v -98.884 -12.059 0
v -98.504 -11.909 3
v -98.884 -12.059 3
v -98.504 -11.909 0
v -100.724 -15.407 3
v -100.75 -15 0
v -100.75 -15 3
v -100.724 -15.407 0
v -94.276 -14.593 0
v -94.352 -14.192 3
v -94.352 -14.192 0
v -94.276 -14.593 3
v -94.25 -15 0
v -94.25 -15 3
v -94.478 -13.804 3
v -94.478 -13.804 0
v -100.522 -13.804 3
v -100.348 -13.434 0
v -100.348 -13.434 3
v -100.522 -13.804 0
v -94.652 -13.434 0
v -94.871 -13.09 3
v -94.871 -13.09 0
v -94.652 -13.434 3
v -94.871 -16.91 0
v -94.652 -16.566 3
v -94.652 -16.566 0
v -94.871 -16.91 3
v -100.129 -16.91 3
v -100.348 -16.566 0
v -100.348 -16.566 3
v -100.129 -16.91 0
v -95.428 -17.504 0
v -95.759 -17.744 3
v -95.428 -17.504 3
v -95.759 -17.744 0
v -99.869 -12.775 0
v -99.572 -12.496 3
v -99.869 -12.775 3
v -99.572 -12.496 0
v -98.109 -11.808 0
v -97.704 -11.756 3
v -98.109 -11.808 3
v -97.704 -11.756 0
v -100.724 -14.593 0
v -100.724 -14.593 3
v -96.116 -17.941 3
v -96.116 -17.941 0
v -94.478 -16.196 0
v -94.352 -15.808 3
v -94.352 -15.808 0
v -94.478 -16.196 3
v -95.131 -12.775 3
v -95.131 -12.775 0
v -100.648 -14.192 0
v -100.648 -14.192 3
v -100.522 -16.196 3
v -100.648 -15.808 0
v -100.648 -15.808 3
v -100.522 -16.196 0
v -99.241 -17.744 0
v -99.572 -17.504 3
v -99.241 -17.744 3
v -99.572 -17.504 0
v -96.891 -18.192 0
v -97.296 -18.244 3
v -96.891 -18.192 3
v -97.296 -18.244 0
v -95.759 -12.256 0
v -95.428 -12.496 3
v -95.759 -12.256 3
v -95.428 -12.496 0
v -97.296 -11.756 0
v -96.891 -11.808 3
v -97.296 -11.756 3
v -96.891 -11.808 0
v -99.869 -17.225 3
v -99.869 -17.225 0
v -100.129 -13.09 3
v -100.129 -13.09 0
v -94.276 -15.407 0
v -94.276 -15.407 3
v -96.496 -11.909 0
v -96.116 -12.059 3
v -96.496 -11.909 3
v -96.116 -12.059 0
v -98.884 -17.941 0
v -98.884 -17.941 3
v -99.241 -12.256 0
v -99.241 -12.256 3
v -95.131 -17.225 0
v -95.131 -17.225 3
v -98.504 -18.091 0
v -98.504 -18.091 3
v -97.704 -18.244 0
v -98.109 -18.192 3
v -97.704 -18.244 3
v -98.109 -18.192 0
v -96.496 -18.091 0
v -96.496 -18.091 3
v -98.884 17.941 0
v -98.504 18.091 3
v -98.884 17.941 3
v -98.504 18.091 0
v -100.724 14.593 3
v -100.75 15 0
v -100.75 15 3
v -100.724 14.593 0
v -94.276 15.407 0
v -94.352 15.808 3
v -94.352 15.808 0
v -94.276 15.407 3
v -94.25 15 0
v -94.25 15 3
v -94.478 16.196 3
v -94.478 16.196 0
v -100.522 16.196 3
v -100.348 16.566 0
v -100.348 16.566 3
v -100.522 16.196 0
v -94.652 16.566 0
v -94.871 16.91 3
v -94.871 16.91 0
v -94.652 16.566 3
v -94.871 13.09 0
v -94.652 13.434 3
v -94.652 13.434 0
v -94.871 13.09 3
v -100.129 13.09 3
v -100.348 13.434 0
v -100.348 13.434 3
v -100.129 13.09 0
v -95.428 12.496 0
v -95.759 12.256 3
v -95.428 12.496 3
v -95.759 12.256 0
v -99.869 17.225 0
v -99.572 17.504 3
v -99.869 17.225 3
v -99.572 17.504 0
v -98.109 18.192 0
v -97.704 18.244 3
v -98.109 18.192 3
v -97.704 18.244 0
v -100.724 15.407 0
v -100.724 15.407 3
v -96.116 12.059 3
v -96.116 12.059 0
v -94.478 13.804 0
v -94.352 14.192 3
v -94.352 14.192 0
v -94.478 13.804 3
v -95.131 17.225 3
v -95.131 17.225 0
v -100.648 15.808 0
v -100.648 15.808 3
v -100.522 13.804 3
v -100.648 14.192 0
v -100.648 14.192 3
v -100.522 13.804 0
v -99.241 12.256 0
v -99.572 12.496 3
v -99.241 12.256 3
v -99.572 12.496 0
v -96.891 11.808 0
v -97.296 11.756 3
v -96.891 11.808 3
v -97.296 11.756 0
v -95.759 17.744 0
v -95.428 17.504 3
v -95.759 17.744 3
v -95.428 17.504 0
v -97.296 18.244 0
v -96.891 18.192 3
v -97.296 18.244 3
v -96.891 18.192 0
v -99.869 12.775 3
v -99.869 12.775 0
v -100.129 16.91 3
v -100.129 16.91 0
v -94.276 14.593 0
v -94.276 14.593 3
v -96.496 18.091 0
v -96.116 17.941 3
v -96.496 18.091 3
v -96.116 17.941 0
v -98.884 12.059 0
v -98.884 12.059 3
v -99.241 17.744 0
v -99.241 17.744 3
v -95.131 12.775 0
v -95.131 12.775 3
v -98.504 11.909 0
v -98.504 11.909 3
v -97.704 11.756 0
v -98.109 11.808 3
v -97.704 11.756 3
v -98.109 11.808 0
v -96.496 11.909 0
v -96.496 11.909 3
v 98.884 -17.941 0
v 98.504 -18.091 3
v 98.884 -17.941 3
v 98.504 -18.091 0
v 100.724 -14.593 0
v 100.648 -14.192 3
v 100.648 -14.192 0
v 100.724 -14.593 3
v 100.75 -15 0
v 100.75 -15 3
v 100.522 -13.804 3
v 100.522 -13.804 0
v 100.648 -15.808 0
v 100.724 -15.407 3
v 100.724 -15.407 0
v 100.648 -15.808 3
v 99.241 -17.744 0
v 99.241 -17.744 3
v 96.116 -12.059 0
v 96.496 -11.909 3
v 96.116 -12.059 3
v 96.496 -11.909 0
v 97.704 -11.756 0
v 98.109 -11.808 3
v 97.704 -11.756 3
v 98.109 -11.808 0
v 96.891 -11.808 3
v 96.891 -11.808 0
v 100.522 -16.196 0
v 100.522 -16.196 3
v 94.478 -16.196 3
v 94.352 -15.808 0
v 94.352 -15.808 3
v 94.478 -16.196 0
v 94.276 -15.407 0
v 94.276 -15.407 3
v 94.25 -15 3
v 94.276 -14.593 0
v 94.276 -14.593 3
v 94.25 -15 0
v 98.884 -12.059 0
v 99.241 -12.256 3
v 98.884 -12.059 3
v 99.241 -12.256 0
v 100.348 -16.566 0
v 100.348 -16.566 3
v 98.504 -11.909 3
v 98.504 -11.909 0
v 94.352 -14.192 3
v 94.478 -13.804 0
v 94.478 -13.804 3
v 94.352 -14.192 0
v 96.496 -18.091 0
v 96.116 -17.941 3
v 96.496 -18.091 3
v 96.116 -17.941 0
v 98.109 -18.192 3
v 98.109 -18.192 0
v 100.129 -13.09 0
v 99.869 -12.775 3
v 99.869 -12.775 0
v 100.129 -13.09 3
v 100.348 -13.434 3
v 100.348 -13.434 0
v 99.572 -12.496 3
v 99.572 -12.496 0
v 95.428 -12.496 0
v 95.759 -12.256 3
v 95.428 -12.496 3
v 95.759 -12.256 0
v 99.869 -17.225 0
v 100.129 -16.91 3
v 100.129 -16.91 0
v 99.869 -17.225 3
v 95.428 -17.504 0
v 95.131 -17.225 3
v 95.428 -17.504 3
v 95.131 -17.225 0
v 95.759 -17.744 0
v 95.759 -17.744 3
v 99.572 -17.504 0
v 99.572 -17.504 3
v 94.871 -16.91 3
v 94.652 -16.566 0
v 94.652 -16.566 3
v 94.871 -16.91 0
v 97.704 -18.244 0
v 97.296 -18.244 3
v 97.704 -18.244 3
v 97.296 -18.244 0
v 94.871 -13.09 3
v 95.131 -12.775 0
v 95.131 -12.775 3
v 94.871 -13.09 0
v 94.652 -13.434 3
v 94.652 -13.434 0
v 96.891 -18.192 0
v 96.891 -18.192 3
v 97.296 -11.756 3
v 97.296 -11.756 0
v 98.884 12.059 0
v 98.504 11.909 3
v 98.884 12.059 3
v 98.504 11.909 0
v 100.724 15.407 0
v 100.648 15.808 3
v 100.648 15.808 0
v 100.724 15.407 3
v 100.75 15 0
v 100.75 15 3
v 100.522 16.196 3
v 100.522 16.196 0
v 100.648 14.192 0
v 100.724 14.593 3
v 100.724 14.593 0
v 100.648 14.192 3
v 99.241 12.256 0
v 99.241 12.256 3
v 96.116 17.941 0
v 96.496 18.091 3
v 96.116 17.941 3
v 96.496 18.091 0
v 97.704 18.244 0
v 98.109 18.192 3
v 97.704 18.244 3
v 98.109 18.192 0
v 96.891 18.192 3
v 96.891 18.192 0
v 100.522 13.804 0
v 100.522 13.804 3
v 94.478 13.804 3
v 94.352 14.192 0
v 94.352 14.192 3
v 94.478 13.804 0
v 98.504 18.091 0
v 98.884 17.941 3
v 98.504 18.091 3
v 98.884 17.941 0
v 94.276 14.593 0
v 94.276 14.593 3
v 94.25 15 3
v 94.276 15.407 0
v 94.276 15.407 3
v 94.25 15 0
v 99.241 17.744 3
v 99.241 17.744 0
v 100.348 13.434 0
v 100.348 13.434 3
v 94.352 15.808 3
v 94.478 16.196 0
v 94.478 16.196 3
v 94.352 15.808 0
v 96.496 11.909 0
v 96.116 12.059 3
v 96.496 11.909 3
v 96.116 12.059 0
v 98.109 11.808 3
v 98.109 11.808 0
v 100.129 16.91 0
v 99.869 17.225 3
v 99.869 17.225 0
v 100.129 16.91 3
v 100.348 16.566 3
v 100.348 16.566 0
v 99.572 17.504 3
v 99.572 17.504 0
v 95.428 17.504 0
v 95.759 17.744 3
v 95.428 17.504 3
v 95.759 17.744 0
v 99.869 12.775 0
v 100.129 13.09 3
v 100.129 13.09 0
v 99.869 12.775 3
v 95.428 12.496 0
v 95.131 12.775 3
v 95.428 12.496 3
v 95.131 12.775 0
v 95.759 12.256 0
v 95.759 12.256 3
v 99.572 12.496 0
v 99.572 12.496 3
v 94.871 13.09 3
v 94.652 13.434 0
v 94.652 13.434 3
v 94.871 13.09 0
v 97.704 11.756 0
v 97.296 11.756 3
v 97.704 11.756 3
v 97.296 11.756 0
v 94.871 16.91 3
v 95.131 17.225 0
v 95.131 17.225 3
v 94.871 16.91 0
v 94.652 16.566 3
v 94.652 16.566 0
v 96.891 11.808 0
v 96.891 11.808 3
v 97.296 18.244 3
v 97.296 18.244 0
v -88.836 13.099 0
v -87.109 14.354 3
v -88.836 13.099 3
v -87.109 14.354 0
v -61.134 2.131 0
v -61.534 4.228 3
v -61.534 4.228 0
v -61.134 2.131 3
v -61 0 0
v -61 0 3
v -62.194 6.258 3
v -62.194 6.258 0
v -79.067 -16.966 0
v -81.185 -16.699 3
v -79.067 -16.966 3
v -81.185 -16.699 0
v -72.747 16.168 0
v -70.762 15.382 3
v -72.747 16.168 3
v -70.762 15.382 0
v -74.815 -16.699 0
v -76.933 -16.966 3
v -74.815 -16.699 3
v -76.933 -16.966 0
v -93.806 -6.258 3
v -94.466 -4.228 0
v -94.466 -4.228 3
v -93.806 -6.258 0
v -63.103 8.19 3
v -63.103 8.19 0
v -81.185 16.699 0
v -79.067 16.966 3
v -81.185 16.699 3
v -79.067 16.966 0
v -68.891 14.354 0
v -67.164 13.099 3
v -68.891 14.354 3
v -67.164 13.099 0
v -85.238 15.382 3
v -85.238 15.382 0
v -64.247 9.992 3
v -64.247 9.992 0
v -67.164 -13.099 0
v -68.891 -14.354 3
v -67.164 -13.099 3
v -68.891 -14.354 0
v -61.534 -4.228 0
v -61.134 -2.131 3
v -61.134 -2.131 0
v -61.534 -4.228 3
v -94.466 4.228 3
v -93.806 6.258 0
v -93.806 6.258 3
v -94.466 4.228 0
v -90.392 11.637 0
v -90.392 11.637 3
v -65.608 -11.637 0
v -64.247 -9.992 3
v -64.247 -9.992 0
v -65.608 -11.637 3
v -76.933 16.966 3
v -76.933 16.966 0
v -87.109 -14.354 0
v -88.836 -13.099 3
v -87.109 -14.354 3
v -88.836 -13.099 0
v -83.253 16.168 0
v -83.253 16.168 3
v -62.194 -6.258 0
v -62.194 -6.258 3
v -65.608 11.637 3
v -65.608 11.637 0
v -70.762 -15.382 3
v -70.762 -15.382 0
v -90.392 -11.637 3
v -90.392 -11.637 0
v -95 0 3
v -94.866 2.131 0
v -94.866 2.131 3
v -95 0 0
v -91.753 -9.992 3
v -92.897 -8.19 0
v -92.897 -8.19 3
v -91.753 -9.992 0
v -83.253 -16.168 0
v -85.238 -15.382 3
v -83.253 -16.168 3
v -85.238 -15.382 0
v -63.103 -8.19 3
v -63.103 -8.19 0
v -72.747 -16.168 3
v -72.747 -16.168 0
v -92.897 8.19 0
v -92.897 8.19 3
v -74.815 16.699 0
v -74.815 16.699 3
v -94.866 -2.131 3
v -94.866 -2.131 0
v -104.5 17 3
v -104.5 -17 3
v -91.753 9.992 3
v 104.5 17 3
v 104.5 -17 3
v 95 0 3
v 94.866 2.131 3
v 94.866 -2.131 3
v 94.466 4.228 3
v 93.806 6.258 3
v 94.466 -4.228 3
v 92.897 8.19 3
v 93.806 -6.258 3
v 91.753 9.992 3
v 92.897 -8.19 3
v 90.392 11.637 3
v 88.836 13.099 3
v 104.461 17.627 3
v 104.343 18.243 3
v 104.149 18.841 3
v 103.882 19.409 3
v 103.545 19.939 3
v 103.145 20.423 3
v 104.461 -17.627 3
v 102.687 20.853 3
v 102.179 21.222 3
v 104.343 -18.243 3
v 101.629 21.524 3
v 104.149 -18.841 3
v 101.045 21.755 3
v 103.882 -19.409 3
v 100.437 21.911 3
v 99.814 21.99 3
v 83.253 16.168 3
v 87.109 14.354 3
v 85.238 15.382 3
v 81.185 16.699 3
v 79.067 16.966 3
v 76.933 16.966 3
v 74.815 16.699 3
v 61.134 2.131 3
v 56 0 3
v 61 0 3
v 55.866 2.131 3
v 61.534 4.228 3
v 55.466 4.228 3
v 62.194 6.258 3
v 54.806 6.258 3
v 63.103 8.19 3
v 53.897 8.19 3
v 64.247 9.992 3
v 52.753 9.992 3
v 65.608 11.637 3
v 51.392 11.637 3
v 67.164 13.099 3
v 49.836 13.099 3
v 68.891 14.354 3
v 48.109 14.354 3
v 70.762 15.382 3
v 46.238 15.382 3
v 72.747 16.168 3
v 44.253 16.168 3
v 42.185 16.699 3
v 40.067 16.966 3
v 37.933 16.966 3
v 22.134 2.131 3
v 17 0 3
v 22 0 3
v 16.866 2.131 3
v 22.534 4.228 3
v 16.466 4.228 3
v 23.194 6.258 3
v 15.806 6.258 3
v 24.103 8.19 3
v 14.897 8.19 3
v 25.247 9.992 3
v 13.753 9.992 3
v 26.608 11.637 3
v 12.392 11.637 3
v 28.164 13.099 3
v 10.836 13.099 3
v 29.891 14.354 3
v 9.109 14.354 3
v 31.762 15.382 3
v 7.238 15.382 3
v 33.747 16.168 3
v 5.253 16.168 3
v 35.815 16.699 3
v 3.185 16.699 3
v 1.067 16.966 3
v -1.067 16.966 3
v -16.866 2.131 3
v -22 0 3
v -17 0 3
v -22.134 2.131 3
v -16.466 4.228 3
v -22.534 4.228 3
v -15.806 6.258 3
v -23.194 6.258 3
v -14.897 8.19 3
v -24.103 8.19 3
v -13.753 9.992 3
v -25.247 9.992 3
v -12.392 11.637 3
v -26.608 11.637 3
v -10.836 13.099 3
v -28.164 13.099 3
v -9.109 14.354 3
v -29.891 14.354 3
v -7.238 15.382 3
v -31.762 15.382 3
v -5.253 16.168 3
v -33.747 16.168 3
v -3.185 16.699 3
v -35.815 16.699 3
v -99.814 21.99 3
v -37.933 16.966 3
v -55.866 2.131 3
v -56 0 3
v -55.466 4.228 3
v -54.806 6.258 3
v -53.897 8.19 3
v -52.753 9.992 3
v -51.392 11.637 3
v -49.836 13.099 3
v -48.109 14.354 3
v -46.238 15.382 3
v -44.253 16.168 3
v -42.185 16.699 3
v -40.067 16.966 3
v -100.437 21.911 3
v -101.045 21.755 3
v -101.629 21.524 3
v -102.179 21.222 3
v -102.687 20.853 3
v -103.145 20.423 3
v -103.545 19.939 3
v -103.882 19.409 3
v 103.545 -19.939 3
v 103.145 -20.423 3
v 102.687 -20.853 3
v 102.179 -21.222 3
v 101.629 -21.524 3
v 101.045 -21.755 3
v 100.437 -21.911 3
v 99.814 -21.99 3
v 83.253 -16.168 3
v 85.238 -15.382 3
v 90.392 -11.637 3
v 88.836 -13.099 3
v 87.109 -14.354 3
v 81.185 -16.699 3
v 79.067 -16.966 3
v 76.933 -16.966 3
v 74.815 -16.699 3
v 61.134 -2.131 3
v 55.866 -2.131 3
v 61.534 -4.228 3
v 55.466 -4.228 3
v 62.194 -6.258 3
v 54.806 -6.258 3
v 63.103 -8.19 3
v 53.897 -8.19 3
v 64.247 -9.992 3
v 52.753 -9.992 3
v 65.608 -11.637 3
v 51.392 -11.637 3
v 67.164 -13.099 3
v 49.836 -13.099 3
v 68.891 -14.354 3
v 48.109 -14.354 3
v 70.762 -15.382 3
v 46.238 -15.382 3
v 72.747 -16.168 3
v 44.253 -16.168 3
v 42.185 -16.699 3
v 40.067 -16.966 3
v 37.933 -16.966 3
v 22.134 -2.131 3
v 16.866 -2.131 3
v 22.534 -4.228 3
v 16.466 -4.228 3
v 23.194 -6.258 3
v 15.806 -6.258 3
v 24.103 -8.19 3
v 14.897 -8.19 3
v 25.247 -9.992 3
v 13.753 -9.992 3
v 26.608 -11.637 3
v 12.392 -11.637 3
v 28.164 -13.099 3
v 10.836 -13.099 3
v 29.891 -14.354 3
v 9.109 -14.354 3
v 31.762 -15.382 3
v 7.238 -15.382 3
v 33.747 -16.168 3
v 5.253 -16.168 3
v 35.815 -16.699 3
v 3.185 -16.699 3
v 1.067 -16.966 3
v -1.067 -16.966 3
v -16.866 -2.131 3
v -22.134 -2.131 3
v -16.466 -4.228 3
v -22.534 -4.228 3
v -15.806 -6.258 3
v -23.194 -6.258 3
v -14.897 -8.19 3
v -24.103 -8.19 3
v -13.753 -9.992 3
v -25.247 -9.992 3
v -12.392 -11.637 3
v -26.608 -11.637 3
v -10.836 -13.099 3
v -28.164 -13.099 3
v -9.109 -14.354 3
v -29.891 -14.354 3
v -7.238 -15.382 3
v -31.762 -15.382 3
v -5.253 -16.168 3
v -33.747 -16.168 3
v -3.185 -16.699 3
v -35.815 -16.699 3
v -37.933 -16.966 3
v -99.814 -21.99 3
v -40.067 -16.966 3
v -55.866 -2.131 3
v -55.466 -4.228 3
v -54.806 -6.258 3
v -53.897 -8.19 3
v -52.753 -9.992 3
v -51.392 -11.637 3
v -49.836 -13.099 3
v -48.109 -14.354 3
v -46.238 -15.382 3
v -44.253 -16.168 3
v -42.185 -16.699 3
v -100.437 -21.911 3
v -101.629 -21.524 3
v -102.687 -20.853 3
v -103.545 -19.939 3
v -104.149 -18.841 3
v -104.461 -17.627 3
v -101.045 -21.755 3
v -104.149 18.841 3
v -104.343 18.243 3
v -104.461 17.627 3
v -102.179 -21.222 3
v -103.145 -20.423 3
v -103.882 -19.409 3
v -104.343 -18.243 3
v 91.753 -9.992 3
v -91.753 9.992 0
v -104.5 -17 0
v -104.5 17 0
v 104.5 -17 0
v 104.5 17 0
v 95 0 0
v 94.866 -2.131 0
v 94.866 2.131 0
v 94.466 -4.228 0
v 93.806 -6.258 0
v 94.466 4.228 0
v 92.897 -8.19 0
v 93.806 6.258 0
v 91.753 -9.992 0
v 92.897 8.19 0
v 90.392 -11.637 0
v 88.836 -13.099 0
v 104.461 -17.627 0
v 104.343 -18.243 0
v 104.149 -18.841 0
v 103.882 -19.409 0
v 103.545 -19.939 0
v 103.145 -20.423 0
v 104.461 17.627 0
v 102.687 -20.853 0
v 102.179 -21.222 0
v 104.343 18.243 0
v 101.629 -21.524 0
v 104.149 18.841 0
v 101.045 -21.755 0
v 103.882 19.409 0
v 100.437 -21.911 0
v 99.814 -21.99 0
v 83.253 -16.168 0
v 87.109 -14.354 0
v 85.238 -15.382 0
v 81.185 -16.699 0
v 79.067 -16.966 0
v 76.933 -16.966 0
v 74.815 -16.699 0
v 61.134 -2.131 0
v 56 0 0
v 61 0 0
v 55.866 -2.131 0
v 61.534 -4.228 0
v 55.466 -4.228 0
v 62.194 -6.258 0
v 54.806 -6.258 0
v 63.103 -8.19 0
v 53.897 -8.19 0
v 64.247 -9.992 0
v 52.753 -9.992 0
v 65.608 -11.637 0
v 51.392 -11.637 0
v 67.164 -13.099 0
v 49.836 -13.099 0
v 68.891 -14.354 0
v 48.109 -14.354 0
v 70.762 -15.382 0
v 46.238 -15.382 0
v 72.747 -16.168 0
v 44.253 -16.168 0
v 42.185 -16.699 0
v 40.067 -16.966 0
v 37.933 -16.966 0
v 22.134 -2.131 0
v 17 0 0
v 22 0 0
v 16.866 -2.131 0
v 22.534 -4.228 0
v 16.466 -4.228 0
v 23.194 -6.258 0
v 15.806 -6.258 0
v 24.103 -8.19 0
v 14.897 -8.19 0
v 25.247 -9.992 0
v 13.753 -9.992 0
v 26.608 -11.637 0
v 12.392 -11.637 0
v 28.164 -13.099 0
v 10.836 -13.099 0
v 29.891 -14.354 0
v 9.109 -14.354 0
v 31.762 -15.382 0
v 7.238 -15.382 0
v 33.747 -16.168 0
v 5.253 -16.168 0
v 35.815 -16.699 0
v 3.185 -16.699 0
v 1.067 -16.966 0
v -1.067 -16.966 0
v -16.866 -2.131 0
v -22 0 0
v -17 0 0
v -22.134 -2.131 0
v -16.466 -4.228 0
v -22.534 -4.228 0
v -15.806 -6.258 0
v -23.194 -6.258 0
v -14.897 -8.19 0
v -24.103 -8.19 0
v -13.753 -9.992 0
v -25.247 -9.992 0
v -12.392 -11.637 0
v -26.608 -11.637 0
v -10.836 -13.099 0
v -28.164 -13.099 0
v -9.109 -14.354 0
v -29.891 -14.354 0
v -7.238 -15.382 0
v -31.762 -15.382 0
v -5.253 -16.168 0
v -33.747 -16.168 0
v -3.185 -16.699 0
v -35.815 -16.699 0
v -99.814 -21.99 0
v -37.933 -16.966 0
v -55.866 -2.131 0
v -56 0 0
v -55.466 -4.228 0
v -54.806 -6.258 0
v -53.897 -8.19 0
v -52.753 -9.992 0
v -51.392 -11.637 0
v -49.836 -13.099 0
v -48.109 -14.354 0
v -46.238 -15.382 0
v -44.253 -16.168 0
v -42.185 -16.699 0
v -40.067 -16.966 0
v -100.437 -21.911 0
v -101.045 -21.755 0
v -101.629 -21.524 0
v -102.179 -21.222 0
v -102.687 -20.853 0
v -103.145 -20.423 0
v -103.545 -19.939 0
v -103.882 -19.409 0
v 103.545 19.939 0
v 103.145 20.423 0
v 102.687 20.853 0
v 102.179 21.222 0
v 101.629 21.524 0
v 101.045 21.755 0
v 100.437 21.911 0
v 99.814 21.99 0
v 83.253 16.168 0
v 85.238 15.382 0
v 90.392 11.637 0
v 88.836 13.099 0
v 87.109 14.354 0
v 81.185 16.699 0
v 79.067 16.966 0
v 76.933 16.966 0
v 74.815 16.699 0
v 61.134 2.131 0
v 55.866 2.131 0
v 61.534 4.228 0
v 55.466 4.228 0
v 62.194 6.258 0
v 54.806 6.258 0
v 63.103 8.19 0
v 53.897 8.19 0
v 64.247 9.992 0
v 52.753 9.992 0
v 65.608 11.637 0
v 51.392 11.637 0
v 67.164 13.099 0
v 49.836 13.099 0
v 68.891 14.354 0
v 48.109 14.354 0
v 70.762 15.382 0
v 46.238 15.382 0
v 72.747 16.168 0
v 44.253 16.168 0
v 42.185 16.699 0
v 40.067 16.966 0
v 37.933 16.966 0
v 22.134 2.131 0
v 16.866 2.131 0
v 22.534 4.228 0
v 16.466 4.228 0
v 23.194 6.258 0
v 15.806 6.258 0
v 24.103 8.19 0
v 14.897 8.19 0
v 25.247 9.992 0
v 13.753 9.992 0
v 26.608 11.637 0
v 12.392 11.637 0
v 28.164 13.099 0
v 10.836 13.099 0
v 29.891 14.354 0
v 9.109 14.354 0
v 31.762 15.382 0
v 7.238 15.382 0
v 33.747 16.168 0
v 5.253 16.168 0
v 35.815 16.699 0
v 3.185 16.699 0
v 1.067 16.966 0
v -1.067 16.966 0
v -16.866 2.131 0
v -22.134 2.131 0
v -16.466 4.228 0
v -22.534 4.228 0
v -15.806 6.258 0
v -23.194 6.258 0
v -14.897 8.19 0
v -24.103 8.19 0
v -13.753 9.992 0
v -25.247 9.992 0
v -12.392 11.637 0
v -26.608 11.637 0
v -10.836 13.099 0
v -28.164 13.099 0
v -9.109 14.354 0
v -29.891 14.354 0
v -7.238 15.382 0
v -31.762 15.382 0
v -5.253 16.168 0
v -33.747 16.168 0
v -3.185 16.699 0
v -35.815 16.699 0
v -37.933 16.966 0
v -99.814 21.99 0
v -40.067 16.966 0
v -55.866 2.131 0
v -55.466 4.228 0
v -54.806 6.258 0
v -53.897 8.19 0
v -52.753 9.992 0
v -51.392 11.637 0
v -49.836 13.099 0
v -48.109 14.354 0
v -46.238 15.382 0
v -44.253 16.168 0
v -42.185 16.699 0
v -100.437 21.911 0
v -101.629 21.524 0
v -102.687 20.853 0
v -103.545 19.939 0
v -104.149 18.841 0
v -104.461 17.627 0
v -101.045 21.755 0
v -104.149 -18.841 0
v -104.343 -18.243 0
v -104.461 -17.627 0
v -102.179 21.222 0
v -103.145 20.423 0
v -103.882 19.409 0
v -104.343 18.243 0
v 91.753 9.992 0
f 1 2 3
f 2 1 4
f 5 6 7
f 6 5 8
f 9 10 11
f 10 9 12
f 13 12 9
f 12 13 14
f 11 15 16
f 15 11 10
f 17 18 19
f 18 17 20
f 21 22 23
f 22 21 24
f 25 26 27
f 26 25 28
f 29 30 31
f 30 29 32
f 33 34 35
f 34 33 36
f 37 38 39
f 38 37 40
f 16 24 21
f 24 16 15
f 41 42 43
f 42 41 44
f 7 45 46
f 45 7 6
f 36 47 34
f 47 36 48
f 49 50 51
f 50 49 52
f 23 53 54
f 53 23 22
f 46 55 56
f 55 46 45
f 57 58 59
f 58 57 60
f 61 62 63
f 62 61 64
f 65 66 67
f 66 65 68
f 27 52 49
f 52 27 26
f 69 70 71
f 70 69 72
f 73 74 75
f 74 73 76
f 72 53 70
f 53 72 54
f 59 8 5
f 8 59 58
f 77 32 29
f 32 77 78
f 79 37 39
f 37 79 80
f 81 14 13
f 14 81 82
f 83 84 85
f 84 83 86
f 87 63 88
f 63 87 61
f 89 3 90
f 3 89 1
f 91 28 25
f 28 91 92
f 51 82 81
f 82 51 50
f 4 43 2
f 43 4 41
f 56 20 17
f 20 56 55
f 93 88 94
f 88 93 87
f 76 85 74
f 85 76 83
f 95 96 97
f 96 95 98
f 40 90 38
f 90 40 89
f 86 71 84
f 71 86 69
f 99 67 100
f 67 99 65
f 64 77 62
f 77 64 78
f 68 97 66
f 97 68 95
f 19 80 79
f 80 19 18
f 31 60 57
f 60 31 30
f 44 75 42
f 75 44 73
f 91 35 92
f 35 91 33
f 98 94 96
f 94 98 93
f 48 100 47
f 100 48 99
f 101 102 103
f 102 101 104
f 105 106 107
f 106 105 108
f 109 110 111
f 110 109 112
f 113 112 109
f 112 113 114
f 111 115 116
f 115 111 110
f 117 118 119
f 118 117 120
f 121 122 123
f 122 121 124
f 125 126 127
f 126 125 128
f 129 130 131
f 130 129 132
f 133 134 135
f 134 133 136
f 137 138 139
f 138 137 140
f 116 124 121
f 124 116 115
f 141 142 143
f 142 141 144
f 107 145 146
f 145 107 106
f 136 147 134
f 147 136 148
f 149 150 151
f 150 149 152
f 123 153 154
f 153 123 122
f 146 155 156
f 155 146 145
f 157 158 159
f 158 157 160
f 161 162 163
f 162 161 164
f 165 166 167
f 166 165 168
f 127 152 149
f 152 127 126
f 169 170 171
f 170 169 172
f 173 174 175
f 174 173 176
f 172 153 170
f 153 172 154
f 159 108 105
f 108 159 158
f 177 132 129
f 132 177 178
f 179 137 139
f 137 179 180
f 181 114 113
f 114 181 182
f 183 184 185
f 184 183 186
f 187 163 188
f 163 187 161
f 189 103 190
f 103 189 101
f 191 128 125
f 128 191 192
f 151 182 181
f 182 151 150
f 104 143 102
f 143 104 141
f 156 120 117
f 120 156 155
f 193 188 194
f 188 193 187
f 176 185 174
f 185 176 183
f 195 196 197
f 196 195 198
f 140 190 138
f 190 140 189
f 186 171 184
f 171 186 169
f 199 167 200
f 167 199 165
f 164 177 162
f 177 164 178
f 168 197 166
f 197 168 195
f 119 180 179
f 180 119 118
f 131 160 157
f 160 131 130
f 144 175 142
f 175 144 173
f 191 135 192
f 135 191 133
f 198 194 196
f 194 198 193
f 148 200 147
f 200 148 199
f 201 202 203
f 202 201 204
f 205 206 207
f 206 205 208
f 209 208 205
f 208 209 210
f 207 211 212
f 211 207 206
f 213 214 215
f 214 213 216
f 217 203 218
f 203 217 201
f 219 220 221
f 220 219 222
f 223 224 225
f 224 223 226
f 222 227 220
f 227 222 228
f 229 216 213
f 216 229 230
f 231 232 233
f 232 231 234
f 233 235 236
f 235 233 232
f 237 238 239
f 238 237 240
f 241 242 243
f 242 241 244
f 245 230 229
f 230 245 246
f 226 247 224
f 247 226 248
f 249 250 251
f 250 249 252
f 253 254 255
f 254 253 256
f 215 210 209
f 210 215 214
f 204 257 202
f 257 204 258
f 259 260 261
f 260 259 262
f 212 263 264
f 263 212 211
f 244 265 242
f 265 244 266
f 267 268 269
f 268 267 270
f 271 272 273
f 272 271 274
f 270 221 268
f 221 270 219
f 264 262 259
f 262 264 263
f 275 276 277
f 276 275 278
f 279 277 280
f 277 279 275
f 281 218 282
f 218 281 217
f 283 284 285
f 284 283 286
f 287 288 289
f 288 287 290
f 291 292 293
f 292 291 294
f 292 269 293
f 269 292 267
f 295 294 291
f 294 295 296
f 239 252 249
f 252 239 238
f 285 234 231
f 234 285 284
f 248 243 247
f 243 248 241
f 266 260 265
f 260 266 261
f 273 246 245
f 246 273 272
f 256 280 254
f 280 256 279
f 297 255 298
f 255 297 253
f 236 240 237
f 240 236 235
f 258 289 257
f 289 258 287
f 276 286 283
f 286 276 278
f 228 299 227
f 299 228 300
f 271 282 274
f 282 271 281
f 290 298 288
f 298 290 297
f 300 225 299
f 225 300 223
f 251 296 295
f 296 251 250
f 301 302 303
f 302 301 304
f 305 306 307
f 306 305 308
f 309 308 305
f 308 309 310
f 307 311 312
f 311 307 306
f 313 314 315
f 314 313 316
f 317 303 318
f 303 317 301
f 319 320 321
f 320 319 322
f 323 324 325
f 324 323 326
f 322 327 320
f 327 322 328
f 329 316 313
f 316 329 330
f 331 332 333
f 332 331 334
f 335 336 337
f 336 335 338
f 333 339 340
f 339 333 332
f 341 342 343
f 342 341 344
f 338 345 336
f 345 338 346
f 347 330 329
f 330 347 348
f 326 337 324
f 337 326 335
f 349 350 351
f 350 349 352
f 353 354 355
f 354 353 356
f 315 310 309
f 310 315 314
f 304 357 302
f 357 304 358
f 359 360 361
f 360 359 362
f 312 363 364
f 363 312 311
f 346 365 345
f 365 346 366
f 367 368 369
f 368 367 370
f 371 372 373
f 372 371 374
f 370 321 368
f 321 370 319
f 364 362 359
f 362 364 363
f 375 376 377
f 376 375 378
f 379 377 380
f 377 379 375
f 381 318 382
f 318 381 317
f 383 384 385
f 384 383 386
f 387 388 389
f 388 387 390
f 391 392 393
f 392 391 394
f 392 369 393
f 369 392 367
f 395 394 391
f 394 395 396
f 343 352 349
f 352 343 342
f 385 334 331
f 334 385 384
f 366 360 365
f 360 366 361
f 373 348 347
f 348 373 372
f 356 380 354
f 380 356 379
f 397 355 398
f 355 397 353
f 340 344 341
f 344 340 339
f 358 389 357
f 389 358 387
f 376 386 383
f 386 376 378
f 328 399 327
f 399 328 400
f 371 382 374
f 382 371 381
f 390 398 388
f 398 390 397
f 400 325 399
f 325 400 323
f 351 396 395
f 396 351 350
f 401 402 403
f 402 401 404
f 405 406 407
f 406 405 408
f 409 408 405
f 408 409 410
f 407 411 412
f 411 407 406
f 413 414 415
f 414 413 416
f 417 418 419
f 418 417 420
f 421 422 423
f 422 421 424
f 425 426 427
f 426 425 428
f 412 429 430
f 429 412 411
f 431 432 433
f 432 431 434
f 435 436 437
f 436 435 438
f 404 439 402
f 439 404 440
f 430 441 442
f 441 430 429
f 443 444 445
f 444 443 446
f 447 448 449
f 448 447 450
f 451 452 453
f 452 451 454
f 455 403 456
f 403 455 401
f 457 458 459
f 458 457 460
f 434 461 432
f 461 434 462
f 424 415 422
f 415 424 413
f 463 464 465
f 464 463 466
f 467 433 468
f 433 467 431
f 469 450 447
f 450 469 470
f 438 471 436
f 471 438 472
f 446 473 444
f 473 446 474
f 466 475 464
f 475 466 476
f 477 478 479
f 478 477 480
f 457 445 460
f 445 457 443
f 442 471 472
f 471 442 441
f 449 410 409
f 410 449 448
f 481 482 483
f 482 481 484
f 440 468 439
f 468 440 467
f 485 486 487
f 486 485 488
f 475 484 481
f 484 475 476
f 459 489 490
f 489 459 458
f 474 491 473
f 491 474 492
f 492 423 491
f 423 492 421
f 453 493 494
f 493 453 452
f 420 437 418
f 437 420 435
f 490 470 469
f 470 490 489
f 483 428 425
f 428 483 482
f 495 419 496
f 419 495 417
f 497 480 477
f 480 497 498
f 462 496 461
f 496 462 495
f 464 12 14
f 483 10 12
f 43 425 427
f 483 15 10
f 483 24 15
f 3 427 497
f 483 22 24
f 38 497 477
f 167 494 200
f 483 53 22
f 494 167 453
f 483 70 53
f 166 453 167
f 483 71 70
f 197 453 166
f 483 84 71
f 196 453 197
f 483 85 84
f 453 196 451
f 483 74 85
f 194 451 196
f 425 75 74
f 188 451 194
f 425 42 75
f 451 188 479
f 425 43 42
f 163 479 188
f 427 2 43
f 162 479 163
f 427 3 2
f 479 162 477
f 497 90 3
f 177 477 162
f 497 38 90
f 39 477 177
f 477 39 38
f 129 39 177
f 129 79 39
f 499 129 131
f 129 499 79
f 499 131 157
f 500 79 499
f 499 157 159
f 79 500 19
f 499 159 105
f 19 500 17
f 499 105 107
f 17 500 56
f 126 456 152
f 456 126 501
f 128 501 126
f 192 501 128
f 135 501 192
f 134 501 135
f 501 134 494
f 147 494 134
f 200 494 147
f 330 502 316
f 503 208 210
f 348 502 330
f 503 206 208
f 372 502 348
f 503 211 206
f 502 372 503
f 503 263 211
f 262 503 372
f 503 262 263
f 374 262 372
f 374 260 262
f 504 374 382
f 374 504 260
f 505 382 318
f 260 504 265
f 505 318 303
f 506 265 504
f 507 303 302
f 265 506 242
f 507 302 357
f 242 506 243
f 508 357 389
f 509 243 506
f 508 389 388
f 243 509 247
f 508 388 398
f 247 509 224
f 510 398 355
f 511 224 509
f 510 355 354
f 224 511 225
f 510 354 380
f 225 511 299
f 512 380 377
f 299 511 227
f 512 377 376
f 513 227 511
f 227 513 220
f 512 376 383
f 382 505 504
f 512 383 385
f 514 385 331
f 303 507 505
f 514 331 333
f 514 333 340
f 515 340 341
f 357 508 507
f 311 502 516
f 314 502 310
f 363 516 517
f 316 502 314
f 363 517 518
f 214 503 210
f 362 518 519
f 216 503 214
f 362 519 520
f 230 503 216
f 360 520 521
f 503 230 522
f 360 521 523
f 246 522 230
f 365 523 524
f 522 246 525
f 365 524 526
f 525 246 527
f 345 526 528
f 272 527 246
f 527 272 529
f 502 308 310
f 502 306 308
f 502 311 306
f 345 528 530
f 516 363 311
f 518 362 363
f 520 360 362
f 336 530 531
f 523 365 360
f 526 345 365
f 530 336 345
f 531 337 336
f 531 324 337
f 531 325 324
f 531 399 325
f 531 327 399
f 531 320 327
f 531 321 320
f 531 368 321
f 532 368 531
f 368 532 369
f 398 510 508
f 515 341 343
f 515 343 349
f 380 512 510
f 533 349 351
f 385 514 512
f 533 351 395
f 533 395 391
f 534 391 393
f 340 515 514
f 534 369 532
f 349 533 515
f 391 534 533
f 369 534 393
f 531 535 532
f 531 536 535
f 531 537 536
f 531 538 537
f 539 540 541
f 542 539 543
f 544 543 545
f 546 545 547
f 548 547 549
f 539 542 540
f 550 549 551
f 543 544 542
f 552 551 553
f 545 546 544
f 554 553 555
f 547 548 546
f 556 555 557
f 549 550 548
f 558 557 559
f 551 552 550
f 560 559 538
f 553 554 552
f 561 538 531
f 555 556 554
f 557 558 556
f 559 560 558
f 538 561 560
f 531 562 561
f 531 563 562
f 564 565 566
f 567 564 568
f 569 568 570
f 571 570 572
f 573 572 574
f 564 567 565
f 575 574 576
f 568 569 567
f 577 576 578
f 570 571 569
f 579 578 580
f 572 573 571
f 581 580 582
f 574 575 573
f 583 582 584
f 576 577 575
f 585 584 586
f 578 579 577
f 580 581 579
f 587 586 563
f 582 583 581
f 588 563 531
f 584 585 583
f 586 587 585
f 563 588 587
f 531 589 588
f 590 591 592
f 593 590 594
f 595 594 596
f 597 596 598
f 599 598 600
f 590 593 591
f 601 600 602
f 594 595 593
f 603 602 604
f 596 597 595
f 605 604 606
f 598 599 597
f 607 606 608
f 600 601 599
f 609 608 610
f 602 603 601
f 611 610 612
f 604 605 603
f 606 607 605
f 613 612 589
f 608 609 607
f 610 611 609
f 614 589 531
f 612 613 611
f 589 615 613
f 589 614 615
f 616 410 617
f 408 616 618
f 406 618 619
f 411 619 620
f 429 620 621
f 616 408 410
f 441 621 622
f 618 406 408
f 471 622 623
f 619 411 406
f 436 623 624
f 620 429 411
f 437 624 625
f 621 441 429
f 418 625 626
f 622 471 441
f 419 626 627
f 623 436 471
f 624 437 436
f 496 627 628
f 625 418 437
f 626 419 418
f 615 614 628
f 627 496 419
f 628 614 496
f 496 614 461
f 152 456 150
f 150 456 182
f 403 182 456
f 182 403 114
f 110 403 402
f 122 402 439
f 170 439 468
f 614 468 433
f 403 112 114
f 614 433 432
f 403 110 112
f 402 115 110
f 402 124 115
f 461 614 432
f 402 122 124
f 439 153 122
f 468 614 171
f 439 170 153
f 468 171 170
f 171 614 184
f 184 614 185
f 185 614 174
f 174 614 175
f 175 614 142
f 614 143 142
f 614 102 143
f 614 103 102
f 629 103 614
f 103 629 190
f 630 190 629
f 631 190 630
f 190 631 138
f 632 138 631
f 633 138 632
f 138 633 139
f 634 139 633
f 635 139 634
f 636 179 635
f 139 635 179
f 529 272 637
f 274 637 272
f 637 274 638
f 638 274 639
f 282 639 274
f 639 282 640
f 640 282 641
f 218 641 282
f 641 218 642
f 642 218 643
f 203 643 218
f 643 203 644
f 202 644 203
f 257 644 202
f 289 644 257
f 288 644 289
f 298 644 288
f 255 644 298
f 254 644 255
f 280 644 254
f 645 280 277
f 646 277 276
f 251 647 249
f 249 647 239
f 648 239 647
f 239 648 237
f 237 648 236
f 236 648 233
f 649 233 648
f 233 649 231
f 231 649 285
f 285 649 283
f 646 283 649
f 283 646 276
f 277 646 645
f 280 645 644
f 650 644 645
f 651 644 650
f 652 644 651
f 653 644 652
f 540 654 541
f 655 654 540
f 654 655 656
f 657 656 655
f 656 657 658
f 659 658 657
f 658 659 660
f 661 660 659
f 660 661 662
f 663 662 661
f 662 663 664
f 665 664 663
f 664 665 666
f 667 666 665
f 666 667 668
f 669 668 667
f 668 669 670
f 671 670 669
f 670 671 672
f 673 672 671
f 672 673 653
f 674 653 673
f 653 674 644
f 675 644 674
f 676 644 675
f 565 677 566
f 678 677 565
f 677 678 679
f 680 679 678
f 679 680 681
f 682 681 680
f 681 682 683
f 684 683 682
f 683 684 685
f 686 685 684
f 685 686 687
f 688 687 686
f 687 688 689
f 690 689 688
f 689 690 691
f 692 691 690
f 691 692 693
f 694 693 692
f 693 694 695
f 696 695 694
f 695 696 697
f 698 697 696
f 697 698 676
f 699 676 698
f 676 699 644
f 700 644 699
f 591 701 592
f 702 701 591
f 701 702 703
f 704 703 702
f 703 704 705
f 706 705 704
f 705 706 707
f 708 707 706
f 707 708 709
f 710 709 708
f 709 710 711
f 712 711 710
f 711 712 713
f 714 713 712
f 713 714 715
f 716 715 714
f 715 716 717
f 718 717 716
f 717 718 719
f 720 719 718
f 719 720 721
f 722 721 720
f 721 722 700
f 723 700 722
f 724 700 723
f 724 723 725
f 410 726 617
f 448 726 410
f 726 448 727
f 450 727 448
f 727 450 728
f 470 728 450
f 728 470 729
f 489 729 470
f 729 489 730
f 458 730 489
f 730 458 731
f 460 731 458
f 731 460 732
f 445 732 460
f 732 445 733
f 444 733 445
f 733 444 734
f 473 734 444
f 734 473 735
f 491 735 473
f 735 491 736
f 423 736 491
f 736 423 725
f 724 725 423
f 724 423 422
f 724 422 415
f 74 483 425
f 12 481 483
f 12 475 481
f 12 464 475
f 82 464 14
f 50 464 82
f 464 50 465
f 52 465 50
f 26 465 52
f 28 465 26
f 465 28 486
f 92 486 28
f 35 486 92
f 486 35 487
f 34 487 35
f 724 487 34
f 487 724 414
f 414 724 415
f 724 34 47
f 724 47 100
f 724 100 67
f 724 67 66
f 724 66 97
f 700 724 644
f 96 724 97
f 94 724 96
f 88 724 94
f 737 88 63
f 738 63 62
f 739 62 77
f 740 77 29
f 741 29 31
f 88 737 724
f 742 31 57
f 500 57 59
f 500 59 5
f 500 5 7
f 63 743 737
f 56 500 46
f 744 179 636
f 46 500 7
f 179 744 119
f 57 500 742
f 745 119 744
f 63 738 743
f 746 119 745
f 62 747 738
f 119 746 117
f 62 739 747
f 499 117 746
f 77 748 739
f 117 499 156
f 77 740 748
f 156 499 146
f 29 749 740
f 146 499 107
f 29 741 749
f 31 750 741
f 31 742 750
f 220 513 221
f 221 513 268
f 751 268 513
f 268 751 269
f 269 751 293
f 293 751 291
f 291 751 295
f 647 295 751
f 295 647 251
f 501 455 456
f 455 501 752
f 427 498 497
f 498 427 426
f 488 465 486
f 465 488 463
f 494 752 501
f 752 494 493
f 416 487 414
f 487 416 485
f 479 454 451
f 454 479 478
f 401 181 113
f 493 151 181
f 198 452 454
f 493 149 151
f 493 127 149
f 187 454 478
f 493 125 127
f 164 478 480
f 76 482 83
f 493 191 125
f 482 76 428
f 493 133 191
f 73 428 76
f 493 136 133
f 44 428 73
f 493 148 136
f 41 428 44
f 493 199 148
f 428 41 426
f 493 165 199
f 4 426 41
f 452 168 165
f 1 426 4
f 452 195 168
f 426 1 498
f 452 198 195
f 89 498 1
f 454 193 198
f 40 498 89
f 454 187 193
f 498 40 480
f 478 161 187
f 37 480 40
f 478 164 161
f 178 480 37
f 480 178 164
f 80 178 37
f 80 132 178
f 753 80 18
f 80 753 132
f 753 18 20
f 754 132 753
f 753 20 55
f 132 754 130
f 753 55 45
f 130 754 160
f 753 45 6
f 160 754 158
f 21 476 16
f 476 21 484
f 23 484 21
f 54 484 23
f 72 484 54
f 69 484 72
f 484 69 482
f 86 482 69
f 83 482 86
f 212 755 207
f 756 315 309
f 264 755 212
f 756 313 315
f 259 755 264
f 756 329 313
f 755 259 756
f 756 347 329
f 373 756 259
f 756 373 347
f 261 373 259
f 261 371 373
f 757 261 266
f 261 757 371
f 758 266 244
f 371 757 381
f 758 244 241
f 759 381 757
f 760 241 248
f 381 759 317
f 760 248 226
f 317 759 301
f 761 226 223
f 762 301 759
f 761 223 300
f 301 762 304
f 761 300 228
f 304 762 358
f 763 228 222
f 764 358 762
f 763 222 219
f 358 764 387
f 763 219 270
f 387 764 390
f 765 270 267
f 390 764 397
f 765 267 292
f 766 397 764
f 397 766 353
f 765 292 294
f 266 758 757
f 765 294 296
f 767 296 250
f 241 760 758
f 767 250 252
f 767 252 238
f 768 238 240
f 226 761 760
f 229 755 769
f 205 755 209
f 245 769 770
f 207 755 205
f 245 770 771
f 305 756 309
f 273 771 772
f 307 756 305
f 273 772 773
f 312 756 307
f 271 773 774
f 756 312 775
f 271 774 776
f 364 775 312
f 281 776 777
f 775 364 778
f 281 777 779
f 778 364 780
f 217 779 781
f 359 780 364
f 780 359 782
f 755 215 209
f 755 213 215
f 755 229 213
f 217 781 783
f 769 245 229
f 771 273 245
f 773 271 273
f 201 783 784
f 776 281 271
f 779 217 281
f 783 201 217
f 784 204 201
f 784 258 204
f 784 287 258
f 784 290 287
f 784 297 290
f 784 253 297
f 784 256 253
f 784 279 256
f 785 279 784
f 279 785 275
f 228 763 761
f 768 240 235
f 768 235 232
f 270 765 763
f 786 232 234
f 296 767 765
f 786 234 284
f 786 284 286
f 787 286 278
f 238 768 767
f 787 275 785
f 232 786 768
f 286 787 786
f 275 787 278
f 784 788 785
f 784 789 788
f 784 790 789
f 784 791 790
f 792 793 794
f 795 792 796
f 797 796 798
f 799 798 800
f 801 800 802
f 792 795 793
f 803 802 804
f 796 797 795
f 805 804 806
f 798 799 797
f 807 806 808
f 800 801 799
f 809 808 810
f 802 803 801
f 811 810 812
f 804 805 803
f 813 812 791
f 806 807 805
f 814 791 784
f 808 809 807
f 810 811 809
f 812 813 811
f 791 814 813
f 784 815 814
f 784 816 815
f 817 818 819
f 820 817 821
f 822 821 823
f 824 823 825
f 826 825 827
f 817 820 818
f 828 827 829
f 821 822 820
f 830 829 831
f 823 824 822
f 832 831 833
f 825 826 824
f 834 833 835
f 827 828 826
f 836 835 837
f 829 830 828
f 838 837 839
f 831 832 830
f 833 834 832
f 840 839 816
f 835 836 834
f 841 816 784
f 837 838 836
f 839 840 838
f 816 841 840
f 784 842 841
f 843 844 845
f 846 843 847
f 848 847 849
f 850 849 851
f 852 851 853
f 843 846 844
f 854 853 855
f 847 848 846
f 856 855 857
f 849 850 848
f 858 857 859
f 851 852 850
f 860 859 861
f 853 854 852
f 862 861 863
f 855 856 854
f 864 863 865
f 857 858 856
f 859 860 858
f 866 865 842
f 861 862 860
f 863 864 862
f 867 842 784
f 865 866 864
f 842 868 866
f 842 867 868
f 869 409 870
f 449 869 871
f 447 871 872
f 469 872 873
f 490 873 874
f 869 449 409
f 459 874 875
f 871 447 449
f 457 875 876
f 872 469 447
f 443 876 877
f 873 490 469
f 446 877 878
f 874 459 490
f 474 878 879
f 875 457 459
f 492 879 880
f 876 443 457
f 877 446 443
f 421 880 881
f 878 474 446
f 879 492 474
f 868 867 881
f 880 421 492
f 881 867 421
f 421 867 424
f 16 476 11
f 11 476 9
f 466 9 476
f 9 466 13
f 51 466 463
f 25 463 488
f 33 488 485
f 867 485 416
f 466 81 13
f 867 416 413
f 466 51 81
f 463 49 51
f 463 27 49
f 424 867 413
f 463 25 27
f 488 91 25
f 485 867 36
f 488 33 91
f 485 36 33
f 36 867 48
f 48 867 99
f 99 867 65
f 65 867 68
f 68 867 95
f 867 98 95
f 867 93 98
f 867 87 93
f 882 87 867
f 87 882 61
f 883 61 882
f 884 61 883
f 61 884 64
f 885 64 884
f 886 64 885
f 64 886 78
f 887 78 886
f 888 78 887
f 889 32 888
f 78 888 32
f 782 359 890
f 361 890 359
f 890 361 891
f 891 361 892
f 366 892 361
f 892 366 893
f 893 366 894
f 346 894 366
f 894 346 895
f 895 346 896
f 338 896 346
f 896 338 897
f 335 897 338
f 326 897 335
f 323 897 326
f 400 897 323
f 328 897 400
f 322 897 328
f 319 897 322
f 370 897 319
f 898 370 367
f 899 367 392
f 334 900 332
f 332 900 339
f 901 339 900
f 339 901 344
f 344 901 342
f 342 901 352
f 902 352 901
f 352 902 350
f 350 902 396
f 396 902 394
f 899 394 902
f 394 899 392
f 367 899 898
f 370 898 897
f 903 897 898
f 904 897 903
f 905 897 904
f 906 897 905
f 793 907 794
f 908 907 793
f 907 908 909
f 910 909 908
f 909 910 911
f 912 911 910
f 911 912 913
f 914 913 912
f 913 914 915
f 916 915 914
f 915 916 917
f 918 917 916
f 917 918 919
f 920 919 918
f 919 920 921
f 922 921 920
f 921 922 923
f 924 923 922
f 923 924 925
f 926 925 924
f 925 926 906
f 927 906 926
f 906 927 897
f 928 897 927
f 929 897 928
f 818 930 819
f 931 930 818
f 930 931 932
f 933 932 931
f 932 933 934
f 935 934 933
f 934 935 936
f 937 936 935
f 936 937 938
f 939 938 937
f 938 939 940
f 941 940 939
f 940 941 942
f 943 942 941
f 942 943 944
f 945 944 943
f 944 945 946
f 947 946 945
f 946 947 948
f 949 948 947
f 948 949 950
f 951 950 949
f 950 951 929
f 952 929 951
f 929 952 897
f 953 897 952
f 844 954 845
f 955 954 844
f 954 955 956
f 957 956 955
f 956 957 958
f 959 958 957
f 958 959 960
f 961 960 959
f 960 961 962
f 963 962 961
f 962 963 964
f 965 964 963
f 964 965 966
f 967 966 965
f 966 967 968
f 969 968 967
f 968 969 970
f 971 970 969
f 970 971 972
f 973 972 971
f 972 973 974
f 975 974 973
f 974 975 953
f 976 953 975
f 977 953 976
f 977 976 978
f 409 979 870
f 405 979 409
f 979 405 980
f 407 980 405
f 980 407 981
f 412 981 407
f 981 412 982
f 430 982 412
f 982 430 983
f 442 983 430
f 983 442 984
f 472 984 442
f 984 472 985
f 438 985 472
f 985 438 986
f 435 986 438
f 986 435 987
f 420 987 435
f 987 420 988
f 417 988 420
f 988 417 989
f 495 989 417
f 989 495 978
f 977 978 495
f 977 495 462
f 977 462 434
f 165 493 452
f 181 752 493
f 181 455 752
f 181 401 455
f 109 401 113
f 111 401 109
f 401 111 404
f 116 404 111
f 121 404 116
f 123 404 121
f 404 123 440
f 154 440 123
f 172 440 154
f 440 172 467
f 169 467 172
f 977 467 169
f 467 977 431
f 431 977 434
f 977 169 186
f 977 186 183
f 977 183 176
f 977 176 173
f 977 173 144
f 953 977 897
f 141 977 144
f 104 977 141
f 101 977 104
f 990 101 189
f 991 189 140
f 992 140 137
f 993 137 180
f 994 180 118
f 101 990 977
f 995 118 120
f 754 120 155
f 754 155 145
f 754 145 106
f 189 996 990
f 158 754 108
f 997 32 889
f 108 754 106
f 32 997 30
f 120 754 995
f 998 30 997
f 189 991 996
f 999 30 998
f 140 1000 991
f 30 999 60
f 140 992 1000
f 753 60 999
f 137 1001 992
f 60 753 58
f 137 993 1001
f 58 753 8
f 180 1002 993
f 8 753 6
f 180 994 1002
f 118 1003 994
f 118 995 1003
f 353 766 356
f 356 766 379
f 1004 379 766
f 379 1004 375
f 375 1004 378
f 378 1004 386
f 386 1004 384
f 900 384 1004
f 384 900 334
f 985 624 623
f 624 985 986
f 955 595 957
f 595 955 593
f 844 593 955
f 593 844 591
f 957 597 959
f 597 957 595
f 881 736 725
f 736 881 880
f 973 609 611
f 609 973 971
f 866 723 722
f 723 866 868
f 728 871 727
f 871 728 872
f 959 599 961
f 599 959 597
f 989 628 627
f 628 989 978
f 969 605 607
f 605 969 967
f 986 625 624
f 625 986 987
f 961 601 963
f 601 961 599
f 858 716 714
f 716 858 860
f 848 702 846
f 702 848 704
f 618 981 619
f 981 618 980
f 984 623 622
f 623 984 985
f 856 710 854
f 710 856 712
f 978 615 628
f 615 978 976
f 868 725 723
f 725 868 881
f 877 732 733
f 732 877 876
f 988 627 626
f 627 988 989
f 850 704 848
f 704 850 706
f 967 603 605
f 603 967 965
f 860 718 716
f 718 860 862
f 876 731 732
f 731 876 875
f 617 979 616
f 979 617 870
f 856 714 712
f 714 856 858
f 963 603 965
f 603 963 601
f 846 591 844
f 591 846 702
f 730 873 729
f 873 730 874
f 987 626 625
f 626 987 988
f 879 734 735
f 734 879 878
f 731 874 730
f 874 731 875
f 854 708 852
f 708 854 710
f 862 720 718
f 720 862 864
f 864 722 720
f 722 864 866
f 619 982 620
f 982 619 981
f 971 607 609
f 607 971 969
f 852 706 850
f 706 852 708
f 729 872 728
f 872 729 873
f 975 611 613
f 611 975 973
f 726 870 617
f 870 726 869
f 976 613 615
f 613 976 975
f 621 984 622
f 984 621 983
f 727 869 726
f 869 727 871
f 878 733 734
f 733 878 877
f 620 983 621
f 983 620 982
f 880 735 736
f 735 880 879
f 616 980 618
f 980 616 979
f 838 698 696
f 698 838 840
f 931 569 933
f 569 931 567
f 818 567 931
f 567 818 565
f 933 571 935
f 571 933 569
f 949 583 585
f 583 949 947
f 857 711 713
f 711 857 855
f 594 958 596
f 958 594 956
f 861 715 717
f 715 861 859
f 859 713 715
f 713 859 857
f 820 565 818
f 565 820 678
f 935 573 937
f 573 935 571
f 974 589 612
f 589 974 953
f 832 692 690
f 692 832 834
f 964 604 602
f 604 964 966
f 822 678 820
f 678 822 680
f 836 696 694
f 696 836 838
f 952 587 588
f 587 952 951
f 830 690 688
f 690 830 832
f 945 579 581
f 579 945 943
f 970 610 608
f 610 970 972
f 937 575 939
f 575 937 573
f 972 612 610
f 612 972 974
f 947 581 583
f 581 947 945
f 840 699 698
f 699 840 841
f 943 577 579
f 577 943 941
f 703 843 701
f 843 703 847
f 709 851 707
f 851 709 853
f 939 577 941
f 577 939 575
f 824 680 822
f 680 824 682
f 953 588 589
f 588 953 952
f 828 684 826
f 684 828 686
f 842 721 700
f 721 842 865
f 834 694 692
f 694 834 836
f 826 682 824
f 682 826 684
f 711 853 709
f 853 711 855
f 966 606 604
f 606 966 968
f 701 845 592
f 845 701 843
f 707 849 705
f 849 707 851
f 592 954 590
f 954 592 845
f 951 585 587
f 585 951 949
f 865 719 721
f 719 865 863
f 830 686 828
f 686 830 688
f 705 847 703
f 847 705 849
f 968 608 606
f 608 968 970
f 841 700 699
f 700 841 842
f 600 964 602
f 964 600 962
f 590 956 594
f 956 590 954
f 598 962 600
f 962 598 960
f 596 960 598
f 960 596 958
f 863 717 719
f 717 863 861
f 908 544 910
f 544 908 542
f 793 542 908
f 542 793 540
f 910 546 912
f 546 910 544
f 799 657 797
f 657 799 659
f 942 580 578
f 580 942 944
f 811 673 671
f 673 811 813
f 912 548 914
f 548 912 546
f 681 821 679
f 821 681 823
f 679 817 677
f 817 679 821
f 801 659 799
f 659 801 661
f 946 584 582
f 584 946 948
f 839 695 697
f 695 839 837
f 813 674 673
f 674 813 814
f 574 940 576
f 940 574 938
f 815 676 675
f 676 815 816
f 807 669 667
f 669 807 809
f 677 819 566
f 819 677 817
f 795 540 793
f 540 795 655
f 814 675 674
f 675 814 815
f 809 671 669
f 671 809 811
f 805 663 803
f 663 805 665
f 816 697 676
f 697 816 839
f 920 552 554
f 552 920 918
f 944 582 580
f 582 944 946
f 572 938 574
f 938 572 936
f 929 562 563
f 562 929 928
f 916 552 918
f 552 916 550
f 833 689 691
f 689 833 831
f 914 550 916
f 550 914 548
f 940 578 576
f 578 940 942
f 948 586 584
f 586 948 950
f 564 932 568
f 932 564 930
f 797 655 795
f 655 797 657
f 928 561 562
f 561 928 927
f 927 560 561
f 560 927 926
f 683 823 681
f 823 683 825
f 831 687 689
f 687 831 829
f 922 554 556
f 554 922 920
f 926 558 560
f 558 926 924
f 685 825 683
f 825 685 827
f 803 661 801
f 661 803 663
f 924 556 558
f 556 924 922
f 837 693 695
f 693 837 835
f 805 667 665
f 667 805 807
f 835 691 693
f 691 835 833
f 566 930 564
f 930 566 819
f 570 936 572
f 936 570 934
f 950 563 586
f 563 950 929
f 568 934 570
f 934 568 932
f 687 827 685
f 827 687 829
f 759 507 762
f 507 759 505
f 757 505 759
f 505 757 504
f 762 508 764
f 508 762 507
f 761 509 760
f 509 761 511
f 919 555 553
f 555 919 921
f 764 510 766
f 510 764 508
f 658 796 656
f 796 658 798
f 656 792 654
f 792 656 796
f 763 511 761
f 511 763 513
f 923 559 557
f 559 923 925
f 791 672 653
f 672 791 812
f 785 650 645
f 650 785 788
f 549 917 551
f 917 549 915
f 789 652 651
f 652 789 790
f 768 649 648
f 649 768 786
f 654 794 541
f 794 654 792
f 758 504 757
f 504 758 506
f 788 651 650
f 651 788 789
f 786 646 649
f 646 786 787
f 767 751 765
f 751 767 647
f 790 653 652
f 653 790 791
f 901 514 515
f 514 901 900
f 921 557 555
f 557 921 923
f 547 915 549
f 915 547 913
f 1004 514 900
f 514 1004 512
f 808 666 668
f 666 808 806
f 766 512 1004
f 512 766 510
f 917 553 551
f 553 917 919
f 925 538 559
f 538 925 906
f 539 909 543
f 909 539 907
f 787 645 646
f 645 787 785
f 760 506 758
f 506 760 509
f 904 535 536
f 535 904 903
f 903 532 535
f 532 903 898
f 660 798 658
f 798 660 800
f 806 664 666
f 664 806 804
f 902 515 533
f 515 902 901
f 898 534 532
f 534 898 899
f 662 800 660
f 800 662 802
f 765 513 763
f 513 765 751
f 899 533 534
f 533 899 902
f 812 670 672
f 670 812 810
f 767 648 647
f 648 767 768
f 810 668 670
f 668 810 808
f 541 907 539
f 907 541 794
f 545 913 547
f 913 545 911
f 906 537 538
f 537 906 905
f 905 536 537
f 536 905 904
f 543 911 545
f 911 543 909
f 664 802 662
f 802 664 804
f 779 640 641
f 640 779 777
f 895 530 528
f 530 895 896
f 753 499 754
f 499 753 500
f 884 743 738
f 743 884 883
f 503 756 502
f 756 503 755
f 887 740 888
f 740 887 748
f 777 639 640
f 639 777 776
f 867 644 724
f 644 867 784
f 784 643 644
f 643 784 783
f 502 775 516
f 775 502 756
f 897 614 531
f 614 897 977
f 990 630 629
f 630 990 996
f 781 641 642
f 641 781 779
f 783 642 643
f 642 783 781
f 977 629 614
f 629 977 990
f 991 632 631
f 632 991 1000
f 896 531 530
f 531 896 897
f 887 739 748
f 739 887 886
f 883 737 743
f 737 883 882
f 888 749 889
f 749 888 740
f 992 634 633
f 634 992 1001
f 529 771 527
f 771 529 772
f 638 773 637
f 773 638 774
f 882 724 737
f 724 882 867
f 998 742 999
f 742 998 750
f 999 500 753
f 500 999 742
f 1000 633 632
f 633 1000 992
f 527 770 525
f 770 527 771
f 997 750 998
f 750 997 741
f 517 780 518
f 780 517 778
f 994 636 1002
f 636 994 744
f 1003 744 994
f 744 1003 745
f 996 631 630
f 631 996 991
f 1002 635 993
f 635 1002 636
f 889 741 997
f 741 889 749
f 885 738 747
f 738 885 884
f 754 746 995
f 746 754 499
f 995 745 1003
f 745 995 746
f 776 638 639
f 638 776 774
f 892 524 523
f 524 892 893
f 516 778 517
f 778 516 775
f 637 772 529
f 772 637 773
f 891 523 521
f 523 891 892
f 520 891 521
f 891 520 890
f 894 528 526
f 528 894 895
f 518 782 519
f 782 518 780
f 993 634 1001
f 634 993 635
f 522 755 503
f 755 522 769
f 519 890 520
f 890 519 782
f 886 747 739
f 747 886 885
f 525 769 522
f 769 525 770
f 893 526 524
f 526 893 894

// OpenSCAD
$fn = 50;


difference() {
	union() {
		hull() {
			translate(v = [-99.5000000000, 17.0000000000, 0]) {
				cylinder(h = 3, r = 5);
			}
			translate(v = [99.5000000000, 17.0000000000, 0]) {
				cylinder(h = 3, r = 5);
			}
			translate(v = [-99.5000000000, -17.0000000000, 0]) {
				cylinder(h = 3, r = 5);
			}
			translate(v = [99.5000000000, -17.0000000000, 0]) {
				cylinder(h = 3, r = 5);
			}
		}
	}
	union() {
		#translate(v = [-97.5000000000, -15.0000000000, -100.0000000000]) {
			cylinder(h = 200, r = 3.2500000000);
		}
		#translate(v = [-97.5000000000, 15.0000000000, -100.0000000000]) {
			cylinder(h = 200, r = 3.2500000000);
		}
		#translate(v = [97.5000000000, -15.0000000000, -100.0000000000]) {
			cylinder(h = 200, r = 3.2500000000);
		}
		#translate(v = [97.5000000000, 15.0000000000, -100.0000000000]) {
			cylinder(h = 200, r = 3.2500000000);
		}
		#translate(v = [-78.0000000000, 0, 0]) {
			cylinder(h = 3, r = 17.0000000000);
		}
		#translate(v = [-39.0000000000, 0, 0]) {
			cylinder(h = 3, r = 17.0000000000);
		}
		#cylinder(h = 3, r = 17.0000000000);
		#translate(v = [39.0000000000, 0, 0]) {
			cylinder(h = 3, r = 17.0000000000);
		}
		#translate(v = [78.0000000000, 0, 0]) {
			cylinder(h = 3, r = 17.0000000000);
		}
	}
}
